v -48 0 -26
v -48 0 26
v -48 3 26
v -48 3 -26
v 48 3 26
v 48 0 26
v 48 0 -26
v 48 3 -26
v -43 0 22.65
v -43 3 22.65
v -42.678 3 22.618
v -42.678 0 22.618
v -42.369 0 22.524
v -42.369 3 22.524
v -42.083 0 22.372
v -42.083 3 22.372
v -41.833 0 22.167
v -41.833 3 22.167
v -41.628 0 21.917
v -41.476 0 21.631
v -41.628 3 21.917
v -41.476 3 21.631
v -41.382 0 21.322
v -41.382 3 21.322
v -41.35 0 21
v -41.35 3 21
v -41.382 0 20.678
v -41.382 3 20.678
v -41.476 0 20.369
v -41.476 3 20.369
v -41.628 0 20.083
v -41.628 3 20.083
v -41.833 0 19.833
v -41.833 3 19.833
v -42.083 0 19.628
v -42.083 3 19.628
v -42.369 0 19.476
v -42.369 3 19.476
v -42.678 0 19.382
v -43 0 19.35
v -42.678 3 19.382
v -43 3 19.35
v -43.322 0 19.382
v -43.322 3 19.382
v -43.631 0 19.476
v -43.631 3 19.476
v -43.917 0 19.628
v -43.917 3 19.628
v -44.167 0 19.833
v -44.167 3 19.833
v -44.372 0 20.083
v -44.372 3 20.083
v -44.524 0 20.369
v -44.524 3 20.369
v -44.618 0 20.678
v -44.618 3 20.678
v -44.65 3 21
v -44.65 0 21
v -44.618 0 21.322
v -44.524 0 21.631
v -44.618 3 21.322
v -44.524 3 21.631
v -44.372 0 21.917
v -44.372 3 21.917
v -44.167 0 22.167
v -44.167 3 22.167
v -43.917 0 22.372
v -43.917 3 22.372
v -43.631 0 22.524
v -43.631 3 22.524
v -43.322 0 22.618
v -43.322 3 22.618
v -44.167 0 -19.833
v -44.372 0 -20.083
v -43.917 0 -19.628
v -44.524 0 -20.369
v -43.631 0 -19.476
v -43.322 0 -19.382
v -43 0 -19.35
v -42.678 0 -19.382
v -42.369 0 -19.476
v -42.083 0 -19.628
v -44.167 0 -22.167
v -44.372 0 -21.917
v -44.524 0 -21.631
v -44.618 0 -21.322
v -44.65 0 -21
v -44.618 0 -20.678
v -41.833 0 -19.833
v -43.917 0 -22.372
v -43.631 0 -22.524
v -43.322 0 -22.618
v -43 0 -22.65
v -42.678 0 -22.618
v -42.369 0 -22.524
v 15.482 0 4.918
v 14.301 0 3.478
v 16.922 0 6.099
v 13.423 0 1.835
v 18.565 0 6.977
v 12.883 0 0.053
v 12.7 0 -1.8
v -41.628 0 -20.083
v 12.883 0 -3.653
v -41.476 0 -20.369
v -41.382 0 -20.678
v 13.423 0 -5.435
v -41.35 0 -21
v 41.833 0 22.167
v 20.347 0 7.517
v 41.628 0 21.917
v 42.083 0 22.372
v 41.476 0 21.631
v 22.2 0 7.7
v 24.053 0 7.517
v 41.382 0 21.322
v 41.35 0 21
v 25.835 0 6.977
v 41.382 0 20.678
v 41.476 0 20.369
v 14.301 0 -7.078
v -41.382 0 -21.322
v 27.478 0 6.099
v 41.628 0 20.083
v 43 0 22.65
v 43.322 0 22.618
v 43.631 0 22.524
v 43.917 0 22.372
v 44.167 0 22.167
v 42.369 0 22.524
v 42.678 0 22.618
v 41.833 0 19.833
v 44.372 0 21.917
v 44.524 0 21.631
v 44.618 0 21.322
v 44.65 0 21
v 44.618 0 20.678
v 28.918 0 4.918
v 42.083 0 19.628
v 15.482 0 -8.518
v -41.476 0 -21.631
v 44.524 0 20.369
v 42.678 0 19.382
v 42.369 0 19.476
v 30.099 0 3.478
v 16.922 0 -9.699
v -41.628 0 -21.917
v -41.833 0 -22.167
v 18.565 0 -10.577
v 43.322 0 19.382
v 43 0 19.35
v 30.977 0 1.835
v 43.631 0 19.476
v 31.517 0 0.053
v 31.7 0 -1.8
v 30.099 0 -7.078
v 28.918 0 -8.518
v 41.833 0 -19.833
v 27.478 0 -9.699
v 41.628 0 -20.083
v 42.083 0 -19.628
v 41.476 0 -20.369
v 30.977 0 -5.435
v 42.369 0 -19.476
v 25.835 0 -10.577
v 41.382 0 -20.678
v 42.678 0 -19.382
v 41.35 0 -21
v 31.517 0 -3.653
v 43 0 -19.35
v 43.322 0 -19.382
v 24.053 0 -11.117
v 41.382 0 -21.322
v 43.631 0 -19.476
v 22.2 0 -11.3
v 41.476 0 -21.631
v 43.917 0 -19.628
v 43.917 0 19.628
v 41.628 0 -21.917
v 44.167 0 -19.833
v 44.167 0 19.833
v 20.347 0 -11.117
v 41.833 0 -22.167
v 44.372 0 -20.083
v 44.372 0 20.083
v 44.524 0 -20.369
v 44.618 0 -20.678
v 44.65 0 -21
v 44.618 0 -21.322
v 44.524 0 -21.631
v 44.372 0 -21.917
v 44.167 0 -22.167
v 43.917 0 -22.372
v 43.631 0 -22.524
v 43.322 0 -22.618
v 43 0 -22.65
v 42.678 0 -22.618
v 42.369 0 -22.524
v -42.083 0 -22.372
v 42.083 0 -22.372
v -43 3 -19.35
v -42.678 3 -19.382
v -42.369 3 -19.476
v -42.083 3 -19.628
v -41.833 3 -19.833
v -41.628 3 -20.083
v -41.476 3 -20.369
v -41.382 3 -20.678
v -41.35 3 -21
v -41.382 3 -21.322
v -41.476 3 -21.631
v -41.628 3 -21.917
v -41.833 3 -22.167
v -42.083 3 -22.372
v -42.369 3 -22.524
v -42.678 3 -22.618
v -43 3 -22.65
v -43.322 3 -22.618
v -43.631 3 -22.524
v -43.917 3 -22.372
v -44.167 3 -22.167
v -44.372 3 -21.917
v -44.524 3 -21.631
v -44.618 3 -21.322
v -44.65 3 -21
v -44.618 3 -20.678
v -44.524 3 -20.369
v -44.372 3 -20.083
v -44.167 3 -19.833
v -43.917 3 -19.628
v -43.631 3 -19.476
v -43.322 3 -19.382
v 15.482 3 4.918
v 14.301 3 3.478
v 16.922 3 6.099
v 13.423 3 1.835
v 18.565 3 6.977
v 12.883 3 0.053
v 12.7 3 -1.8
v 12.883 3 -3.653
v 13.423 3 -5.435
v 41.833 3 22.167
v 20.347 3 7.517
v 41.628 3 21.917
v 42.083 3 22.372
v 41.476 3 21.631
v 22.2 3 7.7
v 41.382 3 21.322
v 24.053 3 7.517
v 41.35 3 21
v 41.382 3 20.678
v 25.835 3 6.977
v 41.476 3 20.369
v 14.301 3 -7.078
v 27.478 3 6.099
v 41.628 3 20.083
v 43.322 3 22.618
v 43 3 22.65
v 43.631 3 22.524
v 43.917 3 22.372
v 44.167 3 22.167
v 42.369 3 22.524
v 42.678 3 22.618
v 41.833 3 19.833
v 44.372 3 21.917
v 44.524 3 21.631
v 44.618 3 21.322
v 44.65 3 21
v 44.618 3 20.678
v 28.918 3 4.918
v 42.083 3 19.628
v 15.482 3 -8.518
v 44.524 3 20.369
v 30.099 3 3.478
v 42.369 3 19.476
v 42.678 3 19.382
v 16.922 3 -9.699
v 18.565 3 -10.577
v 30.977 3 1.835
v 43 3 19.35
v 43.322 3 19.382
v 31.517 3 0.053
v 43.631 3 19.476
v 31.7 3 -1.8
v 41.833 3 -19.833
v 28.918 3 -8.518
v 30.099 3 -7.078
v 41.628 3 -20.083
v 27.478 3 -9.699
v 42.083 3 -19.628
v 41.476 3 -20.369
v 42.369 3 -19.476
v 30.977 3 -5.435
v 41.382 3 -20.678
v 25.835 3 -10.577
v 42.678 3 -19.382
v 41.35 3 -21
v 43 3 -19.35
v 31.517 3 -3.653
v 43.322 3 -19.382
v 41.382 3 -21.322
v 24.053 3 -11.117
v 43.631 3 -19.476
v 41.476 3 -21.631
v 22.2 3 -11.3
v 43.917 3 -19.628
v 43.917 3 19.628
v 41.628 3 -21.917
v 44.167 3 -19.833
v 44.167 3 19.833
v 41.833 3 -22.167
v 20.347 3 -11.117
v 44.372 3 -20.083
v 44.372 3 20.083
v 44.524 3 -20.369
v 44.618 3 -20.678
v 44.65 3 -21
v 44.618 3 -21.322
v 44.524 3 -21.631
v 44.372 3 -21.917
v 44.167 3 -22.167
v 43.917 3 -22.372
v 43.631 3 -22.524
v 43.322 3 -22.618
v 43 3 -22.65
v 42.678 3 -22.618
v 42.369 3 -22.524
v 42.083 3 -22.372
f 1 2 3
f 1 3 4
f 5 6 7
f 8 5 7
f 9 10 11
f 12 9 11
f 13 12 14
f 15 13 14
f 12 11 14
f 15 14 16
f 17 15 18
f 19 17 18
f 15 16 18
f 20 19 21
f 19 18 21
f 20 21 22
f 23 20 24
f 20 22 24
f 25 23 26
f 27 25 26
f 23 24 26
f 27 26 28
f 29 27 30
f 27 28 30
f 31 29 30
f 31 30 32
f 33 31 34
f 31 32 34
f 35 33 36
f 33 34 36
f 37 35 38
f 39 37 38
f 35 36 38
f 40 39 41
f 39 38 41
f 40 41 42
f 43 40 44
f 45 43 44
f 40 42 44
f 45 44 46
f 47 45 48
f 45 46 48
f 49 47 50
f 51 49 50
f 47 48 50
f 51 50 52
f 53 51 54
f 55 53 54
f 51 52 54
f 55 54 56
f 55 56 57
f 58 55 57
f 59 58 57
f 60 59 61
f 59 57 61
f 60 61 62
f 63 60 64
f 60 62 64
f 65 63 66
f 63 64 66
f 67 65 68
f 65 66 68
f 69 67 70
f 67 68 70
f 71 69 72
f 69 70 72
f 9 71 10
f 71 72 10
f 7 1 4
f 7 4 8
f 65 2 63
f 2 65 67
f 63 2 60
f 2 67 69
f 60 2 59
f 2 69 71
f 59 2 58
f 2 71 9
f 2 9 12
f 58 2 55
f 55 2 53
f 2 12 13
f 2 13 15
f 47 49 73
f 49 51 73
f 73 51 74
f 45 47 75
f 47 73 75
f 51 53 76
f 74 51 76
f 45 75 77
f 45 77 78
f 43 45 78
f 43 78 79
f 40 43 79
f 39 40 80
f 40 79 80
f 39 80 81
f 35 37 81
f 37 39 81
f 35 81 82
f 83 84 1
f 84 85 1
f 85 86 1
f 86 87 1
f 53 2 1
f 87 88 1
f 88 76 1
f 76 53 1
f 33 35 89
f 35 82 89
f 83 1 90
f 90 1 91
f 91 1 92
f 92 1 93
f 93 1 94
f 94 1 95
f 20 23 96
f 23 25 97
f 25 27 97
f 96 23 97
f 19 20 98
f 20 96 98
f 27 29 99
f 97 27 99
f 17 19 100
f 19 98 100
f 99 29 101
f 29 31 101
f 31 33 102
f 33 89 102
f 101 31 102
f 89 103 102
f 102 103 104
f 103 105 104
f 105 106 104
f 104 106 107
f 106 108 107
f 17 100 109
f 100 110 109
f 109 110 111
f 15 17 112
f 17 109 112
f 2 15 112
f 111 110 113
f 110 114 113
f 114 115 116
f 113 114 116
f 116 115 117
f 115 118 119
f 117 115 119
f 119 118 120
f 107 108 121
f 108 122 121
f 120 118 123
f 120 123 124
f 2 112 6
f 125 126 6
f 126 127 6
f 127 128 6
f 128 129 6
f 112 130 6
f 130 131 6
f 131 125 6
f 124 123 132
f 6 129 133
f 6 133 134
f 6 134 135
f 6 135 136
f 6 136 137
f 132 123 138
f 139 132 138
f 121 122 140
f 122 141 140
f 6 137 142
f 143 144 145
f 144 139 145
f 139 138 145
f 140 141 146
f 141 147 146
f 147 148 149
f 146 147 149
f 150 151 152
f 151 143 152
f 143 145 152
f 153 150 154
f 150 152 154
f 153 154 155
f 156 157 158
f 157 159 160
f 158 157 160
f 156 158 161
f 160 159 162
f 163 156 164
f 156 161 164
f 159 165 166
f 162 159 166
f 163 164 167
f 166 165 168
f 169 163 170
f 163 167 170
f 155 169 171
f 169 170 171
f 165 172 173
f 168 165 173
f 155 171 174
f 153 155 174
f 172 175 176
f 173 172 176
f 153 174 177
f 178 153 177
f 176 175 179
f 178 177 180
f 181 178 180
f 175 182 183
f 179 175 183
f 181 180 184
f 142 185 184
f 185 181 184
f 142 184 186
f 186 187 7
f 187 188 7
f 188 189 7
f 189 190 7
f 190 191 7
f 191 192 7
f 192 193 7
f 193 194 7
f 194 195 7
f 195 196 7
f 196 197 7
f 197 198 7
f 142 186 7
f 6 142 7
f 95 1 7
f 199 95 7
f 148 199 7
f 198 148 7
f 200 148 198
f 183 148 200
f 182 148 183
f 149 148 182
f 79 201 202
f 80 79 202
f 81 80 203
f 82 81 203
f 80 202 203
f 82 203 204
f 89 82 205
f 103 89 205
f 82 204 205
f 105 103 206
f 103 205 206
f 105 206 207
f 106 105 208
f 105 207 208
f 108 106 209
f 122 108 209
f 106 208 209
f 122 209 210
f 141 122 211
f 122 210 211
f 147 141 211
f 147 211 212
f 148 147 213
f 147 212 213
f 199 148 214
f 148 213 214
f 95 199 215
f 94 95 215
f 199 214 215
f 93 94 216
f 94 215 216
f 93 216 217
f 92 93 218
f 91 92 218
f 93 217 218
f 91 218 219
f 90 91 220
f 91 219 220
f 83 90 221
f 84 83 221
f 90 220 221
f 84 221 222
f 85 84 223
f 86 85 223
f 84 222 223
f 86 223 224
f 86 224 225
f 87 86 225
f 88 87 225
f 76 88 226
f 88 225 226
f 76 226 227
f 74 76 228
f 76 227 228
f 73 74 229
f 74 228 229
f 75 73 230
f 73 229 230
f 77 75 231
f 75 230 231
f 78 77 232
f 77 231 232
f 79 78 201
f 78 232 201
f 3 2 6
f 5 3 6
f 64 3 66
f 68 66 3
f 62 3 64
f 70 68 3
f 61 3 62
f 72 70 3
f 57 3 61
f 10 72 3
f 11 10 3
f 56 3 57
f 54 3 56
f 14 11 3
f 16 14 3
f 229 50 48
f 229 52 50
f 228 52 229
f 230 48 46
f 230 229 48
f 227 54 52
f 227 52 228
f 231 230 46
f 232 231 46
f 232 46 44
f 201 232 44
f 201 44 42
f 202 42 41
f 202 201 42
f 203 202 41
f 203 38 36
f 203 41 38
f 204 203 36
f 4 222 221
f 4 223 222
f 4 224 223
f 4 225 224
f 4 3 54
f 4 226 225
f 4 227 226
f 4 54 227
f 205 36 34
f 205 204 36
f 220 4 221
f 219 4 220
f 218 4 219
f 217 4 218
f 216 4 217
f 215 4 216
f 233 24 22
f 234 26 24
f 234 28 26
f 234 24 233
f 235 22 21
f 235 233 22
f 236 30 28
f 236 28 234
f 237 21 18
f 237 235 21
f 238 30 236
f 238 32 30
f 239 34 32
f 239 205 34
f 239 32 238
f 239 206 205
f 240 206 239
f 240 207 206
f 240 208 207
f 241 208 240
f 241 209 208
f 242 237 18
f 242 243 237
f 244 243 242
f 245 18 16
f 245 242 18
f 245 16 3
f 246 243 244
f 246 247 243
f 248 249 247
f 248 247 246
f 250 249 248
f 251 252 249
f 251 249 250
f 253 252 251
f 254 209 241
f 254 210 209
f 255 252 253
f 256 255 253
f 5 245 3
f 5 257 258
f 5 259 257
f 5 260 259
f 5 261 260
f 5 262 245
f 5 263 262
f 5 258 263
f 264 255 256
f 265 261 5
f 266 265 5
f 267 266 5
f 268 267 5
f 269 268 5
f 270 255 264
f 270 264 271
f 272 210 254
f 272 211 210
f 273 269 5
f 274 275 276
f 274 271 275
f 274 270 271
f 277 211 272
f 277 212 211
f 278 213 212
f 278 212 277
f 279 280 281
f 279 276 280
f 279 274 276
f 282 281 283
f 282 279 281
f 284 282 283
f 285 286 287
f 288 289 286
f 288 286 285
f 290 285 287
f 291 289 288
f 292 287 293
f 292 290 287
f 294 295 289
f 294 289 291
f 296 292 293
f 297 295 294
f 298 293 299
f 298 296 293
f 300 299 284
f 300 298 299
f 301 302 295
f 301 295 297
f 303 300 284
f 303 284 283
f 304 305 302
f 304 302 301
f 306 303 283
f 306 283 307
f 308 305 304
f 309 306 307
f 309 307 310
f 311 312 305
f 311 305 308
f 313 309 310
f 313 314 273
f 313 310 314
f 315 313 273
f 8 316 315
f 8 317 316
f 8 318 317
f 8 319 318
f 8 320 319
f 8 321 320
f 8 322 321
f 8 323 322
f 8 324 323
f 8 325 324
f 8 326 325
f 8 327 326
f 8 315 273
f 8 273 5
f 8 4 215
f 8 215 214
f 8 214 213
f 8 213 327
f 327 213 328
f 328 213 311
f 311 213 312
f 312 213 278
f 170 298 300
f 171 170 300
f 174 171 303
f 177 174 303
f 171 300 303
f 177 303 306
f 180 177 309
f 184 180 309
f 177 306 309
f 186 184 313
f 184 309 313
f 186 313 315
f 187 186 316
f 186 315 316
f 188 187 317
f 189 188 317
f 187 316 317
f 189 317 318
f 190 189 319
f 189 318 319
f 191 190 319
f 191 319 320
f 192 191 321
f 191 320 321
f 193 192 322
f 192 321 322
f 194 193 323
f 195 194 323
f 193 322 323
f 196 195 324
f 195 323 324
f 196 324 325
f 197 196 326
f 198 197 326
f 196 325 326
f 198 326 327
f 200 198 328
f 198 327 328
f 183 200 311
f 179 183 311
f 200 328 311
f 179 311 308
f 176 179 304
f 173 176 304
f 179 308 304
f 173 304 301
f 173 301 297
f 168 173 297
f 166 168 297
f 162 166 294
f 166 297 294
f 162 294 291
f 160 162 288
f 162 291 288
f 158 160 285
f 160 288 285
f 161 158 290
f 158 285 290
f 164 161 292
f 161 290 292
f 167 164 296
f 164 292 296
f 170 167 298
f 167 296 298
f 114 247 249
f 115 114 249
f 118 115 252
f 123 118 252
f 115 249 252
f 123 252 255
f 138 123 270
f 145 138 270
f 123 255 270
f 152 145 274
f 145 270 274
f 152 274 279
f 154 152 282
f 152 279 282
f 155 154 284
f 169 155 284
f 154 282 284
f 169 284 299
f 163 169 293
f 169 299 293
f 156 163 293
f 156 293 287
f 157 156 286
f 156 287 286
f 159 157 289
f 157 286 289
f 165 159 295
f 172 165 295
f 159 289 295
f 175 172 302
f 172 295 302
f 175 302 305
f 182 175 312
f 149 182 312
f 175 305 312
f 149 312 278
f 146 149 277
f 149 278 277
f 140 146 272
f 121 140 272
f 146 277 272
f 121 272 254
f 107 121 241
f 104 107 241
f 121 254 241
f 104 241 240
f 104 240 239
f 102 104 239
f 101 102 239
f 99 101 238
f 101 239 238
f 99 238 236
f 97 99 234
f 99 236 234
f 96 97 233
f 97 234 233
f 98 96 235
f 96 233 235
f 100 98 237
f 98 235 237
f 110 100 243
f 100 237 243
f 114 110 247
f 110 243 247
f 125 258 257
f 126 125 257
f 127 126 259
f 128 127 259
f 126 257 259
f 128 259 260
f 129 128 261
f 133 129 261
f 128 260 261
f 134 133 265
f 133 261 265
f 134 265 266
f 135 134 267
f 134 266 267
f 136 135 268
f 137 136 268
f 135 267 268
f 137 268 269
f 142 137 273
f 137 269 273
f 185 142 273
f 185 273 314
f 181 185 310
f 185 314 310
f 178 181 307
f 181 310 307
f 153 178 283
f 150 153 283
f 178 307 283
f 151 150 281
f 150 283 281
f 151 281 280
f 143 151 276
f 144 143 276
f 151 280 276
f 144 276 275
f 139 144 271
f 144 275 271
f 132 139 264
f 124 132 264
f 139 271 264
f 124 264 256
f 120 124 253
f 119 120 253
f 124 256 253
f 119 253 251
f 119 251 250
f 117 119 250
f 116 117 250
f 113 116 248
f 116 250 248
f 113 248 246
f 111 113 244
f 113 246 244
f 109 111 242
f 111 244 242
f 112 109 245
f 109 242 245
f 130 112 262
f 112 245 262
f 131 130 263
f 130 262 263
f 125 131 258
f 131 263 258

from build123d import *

# Parameters (mm, degrees)
SKETCH1_W           = 96
SKETCH1_H           = 52
BOSS_EXTRUDE1_DEPTH = 3
SKETCH2_R           = 1.65
SKETCH2_R_2         = 9.5
CUT_EXTRUDE1_DEPTH  = 3


with BuildPart() as part:
    # Sketch1 → Boss-Extrude1 (new body)
    with BuildSketch(Plane(origin=(0, 0, 0), x_dir=(1, 0, 0), z_dir=(0, 1, 0))):
        Rectangle(SKETCH1_W, SKETCH1_H)
    extrude(amount=BOSS_EXTRUDE1_DEPTH)

    # Sketch2 → Cut-Extrude1 (cut)
    with BuildSketch(Plane(origin=(0, 3, 0), x_dir=(1, 0, 0), z_dir=(0, 1, 0))):
        with Locations(Location((-43, 21, 0), (0, 0, 270))):
            Circle(SKETCH2_R)
        with Locations(Location((43, 21, 0), (0, 0, 270))):
            Circle(SKETCH2_R)
        with Locations(Location((43, -21, 0), (0, 0, 270))):
            Circle(SKETCH2_R)
        with Locations(Location((-43, -21, 0), (0, 0, 270))):
            Circle(SKETCH2_R)
        with Locations(Location((22.2, 1.8, 0), (0, 0, 270))):
            Circle(SKETCH2_R_2)
    extrude(amount=-CUT_EXTRUDE1_DEPTH, mode=Mode.SUBTRACT)


solid = part.part
